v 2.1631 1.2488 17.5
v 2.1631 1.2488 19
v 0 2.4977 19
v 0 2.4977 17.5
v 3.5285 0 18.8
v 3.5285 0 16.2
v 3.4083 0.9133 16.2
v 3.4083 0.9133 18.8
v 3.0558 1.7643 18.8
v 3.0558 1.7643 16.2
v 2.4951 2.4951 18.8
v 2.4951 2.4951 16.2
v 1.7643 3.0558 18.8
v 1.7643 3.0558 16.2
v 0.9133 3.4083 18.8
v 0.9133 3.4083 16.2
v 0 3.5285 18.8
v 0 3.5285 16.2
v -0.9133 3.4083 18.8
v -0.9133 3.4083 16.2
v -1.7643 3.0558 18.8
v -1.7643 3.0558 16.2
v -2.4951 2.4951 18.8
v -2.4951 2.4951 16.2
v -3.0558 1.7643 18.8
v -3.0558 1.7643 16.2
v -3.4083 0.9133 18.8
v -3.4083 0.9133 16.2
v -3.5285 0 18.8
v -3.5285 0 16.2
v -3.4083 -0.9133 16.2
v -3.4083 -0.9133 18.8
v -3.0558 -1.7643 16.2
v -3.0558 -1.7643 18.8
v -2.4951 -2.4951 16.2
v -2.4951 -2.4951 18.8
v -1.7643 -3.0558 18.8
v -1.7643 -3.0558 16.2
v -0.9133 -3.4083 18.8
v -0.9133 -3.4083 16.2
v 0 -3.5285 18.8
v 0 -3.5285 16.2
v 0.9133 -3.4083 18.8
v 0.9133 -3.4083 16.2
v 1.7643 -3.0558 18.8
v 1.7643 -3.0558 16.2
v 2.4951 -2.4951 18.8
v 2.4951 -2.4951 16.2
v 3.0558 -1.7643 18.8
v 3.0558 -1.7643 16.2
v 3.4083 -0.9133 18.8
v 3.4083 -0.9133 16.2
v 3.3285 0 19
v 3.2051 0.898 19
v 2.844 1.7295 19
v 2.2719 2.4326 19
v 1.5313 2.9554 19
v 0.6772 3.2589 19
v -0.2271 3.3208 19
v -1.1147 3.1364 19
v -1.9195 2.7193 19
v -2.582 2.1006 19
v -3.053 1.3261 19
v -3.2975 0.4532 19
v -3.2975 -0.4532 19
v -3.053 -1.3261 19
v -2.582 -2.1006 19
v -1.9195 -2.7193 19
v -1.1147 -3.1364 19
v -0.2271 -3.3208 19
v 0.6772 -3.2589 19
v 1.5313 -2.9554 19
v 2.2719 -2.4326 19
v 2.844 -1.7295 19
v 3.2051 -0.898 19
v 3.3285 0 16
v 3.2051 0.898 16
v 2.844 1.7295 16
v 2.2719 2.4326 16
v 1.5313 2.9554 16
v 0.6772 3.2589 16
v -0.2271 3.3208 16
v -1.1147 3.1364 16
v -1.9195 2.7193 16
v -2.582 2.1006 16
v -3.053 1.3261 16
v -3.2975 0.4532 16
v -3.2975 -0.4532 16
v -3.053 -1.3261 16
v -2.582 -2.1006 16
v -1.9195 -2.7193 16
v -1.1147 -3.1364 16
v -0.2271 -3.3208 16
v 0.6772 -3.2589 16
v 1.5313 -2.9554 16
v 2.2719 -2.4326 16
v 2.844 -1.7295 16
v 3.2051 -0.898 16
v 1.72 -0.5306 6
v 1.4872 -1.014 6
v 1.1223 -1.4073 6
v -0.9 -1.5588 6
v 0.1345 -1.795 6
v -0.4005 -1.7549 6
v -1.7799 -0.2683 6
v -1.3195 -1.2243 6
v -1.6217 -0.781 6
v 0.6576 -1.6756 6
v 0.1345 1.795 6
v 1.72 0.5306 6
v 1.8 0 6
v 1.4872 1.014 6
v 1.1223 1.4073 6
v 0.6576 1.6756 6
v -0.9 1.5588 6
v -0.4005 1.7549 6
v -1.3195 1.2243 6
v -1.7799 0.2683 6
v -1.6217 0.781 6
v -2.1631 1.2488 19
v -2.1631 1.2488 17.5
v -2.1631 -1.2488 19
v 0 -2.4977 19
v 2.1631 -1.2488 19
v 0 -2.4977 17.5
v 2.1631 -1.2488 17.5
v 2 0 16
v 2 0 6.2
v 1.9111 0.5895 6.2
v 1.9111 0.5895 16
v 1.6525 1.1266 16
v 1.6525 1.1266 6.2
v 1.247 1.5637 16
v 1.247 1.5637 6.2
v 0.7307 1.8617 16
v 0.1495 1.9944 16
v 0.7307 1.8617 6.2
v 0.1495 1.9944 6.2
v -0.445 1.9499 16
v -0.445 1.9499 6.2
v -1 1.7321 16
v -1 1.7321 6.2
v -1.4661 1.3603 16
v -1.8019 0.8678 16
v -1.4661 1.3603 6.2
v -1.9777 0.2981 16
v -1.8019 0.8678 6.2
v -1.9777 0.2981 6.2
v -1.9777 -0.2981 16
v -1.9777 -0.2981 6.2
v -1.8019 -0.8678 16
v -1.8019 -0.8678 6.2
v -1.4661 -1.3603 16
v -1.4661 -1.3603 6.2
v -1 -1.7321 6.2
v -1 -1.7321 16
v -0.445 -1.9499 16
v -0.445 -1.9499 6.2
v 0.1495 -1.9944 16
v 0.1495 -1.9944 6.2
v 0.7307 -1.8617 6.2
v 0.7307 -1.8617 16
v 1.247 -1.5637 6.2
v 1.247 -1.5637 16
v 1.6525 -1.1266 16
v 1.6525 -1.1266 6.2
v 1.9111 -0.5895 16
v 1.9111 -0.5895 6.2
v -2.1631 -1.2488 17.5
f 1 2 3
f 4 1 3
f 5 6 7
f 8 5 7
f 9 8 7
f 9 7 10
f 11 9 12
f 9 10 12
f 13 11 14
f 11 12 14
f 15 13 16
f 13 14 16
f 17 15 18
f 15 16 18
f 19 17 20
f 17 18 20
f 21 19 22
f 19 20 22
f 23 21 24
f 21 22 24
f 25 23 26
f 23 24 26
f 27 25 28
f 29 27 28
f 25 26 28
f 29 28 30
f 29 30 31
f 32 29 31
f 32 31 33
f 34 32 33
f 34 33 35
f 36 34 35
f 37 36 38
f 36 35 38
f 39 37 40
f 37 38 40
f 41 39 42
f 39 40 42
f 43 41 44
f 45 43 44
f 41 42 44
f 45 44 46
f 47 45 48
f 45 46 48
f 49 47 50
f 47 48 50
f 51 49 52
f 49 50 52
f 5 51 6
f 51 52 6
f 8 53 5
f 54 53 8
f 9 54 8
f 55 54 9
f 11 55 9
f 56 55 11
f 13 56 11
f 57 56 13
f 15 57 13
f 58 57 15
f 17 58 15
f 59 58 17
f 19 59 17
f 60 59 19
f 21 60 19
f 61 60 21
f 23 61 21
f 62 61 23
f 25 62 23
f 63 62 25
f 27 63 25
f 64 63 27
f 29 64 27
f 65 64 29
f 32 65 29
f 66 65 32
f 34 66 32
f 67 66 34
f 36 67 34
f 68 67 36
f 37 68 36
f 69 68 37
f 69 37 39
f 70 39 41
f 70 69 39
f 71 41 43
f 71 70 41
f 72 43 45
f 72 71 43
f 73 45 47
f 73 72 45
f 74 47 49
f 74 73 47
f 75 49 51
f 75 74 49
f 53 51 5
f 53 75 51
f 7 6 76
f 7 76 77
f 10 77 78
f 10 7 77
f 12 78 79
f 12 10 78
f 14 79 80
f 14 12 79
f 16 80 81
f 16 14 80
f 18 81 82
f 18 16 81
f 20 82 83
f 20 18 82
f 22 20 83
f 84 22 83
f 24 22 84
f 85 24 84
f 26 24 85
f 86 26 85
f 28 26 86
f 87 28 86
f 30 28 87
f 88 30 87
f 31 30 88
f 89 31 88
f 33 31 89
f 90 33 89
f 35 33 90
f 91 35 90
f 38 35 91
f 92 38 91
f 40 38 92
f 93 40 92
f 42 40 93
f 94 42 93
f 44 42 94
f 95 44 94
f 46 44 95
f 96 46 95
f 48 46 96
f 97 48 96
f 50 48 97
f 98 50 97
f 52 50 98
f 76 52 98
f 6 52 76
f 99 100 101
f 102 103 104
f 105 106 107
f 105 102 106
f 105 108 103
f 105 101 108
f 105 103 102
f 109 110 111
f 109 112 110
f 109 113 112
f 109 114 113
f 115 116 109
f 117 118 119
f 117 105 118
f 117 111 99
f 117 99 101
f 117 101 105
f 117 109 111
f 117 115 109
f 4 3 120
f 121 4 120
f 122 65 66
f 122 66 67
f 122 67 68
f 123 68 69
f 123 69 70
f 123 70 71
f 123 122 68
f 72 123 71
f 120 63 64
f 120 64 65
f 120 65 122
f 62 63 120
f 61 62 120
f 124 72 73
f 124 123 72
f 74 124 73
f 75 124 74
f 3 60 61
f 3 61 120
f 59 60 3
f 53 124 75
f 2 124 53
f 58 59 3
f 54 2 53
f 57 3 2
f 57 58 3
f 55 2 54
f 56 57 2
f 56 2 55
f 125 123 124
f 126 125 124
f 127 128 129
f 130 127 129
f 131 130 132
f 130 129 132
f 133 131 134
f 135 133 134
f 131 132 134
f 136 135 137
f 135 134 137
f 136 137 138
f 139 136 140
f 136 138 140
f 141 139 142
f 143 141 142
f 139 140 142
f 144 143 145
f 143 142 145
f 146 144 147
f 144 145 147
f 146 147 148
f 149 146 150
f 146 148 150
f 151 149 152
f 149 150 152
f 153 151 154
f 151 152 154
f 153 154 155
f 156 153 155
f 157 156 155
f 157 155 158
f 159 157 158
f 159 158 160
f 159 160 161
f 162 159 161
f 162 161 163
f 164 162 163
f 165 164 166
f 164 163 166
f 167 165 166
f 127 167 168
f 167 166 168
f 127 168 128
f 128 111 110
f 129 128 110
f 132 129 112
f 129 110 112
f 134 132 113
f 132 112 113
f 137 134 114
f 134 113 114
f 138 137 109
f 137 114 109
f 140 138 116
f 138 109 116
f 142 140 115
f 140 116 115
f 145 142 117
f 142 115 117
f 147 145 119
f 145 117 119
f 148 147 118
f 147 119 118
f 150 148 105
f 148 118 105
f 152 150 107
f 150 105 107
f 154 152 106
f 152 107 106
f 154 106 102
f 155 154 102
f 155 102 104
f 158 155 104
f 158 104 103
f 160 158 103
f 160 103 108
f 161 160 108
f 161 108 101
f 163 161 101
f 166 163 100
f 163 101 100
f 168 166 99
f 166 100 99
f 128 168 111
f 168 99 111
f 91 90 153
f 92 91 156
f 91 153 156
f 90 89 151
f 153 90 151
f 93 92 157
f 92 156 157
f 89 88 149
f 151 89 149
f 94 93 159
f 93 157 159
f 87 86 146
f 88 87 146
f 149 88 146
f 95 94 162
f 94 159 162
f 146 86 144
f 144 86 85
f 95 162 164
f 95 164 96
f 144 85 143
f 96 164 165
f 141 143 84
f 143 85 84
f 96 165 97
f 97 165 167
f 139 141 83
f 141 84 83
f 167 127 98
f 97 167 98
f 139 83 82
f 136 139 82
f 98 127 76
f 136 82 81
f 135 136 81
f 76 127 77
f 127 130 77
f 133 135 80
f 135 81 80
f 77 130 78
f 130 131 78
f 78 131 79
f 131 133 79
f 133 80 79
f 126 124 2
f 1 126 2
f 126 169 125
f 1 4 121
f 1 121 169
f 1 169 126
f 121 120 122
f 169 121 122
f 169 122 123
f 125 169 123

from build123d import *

# Parameters (mm, degrees)
SKETCH_1_R          = 2
EXTRUDE_1_DEPTH     = 16
SKETCH_2_R          = 3.52854217
EXTRUDE_3_DEPTH     = 3
CUT_EXTRUDE_2_DEPTH = 1.5
CHAMFER_1_SIZE      = 0.2
CHAMFER_2_SIZE      = 0.2
SKETCH_4_R          = 2
CUT_EXTRUDE_3_DEPTH = 6
CHAMFER_3_SIZE      = 0.2


with BuildPart() as part:
    # 草图1 → 凸台-拉伸1 (new body)
    with BuildSketch(Plane.XY):
        Circle(SKETCH_1_R)
    extrude(amount=EXTRUDE_1_DEPTH)

    # 草图2 → 凸台-拉伸3 (add)
    with BuildSketch(Plane.XY.offset(16)):
        Circle(SKETCH_2_R)
    extrude(amount=EXTRUDE_3_DEPTH)

    # 草图3 → 切除-拉伸2 (cut)
    with BuildSketch(Plane.XY.offset(19)):
        Polygon((0, 2.497687594), (-2.163060907, 1.248843797), (-2.163060907, -1.248843797), (0, -2.497687594), (2.163060907, -1.248843797), (2.163060907, 1.248843797), align=None)
    extrude(amount=-CUT_EXTRUDE_2_DEPTH, mode=Mode.SUBTRACT)

    # 倒角1
    chamfer_1_edges = [part.edges().sort_by_distance(p)[0] for p in [
        (-2, 0, 0),
    ]]
    chamfer(chamfer_1_edges, length=CHAMFER_1_SIZE)

    # 倒角2
    chamfer_2_edges = [part.edges().sort_by_distance(p)[0] for p in [
        (-3.52854217, 0, 16),
        (-3.52854217, 0, 19),
    ]]
    chamfer(chamfer_2_edges, length=CHAMFER_2_SIZE)

    # 草图4 → 切除-拉伸3 (cut)
    with BuildSketch(Plane(origin=(0, 0, 0), x_dir=(-1, 0, 0), z_dir=(0, 0, -1))):
        Circle(SKETCH_4_R)
    extrude(amount=-CUT_EXTRUDE_3_DEPTH, mode=Mode.SUBTRACT)

    # 倒角3
    chamfer_3_edges = [part.edges().sort_by_distance(p)[0] for p in [
        (-2, 0, 6),
    ]]
    chamfer(chamfer_3_edges, length=CHAMFER_3_SIZE)


solid = part.part
